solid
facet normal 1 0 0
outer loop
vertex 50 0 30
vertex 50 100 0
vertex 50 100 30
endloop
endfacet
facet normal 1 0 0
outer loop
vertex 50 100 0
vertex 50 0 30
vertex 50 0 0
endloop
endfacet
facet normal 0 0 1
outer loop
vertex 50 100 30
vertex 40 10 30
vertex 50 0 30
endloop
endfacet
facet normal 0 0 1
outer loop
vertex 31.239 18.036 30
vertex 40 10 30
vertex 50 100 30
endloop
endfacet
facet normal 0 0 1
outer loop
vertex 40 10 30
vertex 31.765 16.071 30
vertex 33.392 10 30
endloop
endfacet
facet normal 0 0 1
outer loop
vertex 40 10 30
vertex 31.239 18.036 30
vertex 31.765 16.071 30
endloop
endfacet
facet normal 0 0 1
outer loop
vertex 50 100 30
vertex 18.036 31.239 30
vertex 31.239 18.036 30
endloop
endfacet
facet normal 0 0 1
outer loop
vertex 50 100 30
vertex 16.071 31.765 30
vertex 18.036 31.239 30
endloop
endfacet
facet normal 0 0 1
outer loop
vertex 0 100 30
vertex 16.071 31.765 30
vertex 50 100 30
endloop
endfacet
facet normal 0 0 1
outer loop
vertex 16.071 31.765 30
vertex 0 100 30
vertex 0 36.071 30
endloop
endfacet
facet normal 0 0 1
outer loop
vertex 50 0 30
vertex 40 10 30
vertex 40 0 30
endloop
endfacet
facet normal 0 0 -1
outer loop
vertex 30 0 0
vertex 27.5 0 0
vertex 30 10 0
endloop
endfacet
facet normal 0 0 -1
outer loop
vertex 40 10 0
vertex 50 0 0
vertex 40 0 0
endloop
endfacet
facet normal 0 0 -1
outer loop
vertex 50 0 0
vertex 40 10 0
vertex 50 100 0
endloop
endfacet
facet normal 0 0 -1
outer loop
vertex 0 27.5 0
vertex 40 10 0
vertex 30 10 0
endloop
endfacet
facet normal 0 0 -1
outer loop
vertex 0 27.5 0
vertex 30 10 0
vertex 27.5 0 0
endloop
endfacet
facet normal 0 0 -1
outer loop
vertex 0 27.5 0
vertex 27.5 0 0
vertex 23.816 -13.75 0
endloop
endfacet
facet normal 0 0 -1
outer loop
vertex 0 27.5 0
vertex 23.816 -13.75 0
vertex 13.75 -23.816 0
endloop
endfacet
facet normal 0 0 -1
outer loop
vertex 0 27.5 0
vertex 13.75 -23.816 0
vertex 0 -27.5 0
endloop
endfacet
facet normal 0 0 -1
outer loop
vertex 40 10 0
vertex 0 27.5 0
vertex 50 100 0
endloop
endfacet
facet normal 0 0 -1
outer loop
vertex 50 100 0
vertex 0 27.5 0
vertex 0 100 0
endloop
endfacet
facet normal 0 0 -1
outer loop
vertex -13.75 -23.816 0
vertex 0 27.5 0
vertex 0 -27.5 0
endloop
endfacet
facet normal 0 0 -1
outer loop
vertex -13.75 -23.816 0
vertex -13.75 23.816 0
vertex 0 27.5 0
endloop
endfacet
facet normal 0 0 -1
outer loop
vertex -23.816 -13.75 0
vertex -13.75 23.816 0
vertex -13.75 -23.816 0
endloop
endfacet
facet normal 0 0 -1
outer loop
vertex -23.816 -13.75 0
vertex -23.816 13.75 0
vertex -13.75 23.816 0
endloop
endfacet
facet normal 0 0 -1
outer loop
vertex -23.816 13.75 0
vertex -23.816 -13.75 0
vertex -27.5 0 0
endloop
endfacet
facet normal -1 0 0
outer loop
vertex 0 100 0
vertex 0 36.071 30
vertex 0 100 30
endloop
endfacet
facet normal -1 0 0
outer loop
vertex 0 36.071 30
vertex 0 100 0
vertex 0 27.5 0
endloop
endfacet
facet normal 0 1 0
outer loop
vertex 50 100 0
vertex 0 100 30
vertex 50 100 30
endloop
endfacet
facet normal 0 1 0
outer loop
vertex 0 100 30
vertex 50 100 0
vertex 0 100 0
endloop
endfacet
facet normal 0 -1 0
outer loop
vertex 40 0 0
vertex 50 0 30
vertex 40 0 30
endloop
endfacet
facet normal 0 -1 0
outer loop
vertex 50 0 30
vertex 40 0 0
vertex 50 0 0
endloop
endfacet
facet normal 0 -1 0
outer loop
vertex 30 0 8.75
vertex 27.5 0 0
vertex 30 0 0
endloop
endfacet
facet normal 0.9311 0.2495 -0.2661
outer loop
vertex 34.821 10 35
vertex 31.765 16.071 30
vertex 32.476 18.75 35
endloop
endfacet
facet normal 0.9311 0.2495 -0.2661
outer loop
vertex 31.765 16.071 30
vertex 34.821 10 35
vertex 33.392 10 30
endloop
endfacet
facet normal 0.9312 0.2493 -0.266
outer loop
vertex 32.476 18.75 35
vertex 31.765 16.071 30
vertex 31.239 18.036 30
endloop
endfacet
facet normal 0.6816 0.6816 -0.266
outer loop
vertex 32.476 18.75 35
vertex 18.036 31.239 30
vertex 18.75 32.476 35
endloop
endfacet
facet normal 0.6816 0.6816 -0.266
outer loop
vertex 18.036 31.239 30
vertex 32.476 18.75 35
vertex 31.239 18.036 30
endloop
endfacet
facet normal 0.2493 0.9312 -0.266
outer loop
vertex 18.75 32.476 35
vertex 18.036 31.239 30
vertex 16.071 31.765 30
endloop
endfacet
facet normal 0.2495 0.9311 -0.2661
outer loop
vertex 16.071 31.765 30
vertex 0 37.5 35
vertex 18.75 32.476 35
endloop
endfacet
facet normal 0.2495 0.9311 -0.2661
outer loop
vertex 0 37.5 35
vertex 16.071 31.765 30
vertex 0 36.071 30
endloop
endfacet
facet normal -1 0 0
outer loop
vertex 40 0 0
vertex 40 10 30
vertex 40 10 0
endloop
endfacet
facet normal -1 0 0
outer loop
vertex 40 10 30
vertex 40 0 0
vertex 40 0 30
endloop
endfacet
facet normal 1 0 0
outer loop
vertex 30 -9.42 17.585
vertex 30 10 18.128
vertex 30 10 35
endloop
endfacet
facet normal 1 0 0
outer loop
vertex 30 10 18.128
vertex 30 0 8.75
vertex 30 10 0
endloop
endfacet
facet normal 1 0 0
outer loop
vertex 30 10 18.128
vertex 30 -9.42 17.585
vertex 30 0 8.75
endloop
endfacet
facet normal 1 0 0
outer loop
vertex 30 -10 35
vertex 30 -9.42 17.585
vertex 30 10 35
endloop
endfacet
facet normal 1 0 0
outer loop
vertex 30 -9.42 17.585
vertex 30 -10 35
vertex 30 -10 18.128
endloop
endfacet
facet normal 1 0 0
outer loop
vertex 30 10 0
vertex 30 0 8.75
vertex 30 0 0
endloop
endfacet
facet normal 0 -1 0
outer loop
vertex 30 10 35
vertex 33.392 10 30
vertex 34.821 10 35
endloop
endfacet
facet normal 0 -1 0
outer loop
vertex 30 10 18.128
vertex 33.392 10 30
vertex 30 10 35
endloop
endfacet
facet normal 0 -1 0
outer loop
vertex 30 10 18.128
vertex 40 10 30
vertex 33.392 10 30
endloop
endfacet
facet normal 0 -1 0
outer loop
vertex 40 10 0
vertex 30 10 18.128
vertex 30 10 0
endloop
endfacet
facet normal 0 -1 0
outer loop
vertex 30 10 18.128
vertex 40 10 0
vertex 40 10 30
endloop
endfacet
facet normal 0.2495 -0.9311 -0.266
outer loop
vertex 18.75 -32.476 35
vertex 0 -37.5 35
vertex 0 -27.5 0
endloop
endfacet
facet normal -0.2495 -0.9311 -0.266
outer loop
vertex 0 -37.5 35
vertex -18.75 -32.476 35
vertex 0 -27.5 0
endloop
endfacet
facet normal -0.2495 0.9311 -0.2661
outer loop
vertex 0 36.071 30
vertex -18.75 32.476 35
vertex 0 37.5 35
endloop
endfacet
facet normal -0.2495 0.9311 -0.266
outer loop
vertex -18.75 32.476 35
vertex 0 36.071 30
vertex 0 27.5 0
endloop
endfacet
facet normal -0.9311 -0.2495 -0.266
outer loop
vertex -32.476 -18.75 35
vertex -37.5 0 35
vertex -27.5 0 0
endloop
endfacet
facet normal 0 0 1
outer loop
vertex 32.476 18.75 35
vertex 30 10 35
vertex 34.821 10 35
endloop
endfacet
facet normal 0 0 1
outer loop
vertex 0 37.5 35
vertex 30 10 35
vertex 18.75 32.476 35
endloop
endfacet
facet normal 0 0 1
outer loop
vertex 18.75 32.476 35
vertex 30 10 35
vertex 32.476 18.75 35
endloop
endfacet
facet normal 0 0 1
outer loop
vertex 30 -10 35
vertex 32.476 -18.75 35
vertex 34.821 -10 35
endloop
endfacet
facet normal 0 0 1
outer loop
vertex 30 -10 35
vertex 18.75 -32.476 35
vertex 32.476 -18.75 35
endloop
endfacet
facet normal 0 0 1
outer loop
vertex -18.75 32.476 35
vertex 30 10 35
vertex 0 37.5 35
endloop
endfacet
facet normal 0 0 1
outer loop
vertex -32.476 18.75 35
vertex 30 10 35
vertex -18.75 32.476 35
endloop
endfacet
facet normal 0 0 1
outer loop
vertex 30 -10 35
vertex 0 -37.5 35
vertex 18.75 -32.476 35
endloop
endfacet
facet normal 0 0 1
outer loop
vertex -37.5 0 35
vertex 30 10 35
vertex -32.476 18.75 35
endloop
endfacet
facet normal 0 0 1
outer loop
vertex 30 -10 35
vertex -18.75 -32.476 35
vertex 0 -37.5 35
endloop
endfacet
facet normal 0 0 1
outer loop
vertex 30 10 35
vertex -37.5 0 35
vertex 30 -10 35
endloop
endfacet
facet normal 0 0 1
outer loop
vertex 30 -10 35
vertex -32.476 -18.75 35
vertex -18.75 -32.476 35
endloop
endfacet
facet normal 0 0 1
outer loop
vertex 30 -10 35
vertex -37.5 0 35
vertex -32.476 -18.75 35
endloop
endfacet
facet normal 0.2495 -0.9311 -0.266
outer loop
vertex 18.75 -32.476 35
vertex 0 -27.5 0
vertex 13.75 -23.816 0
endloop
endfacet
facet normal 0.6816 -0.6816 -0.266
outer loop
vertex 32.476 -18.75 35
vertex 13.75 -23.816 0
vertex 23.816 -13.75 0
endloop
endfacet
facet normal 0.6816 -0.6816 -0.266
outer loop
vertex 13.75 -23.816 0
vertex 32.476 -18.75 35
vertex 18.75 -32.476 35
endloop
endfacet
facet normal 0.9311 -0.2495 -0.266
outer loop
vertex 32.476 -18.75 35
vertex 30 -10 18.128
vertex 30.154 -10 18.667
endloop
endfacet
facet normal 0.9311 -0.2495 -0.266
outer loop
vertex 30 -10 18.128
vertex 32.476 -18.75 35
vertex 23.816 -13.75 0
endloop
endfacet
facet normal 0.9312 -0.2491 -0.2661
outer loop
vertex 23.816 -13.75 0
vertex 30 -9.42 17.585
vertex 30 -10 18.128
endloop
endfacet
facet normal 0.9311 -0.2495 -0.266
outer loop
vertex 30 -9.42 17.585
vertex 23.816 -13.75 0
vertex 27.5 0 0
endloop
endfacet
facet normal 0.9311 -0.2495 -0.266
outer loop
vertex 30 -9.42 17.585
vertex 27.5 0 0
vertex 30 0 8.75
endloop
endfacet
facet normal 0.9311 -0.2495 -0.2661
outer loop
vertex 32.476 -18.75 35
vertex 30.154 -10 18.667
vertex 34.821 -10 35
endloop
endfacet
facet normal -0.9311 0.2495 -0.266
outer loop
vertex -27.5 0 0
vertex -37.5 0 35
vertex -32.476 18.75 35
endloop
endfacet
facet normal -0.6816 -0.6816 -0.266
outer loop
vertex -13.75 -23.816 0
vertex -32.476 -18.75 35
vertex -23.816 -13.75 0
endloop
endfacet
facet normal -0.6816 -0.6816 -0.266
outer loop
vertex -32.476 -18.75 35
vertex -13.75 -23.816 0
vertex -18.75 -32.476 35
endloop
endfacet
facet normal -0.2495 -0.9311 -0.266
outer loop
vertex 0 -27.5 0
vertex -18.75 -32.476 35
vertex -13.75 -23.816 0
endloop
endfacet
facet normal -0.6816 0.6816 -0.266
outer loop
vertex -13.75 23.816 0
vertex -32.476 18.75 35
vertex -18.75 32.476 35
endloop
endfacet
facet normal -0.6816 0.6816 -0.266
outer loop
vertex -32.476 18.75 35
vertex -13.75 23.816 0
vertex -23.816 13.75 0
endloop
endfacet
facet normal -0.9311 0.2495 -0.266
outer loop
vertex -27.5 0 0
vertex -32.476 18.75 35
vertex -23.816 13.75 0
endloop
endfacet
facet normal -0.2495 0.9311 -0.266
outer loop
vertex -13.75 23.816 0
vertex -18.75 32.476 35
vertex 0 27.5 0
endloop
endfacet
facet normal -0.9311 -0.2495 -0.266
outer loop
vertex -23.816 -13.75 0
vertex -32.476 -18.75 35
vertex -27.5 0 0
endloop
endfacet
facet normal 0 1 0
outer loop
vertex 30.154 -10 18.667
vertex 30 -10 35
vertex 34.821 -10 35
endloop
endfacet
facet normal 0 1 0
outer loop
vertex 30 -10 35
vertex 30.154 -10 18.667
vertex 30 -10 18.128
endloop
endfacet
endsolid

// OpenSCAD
// * Discription what the *.scad is about ect.

// ==================================
// = Used Libraries =
// ==================================


// ==================================
// = Variables =
// ==================================

// sizing printing or print a small part to test the object.
DesignStatus="sizing"; // ["sizing","fitting","printing"]

GrindingPlate_X=63.5;
GrindingPlate_Y=152.0;
GrindingPlateSteel_h=1.0;
GrindingPlateFoam_h=1.3;

Hole_Count_X=5;
Hole_Count_Y=5;
Width_between_Holes=7;
FrameBezel=0.5;

FrameFoot_X=15.0;
FrameFoot_Y=47.0;

Frame_H=30;
Frame_Top_R=1;
Frame_Base_R=4;


module __Customizer_Limit__ () {}  // bevfore these the variables are usable in the cutomizer
shown_by_customizer = false;
// === Facettes Numbers ===

FrameBase_X=GrindingPlate_X+FrameFoot_X;
FrameBase_Y=GrindingPlate_Y+FrameFoot_Y;



FN_HexNut=6;
FN_Performance=36;
FN_FooBaa=12;
// Divisebile by 4 to align Cylinders whithout small intersections
FN_Rough=12;
FN_MediumRough=16;
FN_Medium=36;
FN_Fine=72;
FN_ExtraFine=144;


// ==================================
// = Tuning Variables =
// ==================================
// Variables for finetuning (The Slegehammer if something has to be made fit)

// ==================================
// = Test Stage =
// ==================================
// BLUEPRINT_Enviroment
module MirrorMirrorOnTheWall(Offset_X,Offset_Y){
    translate([-Offset_X,Offset_Y,0]){
        children();
        mirror([0,1,0]){
            children();
        }
    }
    translate([Offset_X,-Offset_Y,0]){
        mirror([1,0,0]){
            children();
            mirror([1,0,0]){
                children();
            }
        }
    }
}
// BLUEPRINT_Enviroment
if (DesignStatus=="printing"){
    intersection(){
        //TEST_OBJECT(FN_ExtraFine);

        cube([1000,1000,1000],center=true);
    }
}
// BLUEPRINT_Enviroment
if(DesignStatus=="fitting"){
    //TEST_OBJECT(FN_FACETTES=FN_MediumRough);
}
// BLUEPRINT_Enviroment
if (DesignStatus=="sizing"){
    see_me_half(){
        translate([0,0,0]){
            TEST_OBJECT(FN_Rough);
        }
        translate([0,0,0]){
        
        }        
        translate([0,0,0]){
            
        }
        translate([0,0,0]){
        }
        translate([0,0,0]){
        }
        union(){
            TEST_CUTCYLINDER(FN_Rough);
        }
        translate([ 0,0,0]){
        }
    }
}
// BLUEPRINT_Enviroment
module see_me_half(){
    //difference(){
        //union(){
          translate([0,0,0]){
            for(i=[0:1:$children-1]){
                a=255;
                b=50;
                k_farbabstand=((a-b)/$children);
                Farbe=((k_farbabstand*i)/255);
                SINUS_Foo=0.5+(sin(((360/(a-b))*k_farbabstand)*(i+1)))/2;
                COSIN_Foo=0.5+(cos(((360/(a-b))*k_farbabstand)*(i+1)))/2;
                color(c = [ SINUS_Foo,
                            1-(SINUS_Foo/2+COSIN_Foo/2),
                            COSIN_Foo],
                            alpha = 0.5){  
                    //MirrorMirrorOnTheWall(0){
                    difference(){
                        //MirrorMirrorOnTheWall(0){
                            render(convexity=20){children(i);}
                            //children(i);
                            translate([70/2,0,0]){
                                    //cube([80,70,150],center=true);
                                }
                        //}
// Creates a Cutting to see a Sidesection cut of the objects
                            color(c = [ SINUS_Foo,
                                1-(SINUS_Foo/2+COSIN_Foo/2),
                                COSIN_Foo],
                                alpha = 0.0){
                                translate([70/2,0,0]){
                                    #cube([10,20,150],center=true);
                                }
                                translate([0,0,0]){
                                    //cube([30,30,200],center=true);
                                    }
                                }
                            }
                        }
                    }
                }
            }
// == Testprints ==

Projection_Cutter(5){
//see_me_half();
}

//// == Cutes a slice of the Objekts
Intersection_Test_Cut("xy",1.5,16){
 //Intersection_Test_Cut( "xy",           // "Plaine xy yz xz", 
                       // 1,              // Slicethickness , 
                        //5,              // Distance from coordinate origin in plaine )
   // OBJECTMODULESHERE 
   //Frame_Base();
}

// ==================================
// = Modus =
// ==================================

 
// ==================================
// = Stage =
// ==================================
// Final module for Produktion

module Assembly(){

}
module TEST_OBJECT(FN_FACETTES){
    difference(){
        TEST_CUTCUBE();
        TEST_CUTCYLINDER(FN_FACETTES);
    }
}

// ===============================================================================
// =--------------------------------- Enviroment Modules ------------------------=
// ===============================================================================
// Modules that resembles the Enviroment aka the helmet where to atach a camera mount


// ===============================================================================
// =--------------------------------- Modules -----------------------------------=
// ===============================================================================
//TEST_OBJECT();

module TEST_CUTCUBE(){
    cube([50,100,30]);
}
// ===============================================================================
// ---------------------------------- Cutting Modules ----------------------------
// ===============================================================================
// === Half Cutter

//HEX_Mesh_Pattern(){ Mesh(2.5,2.5);}
module HEX_Mesh_Pattern(X=10,Y=30,DELTA=5,GRPL_X=45,GRPL_Y=115){
Count_X=X;
Count_Y=Y;

//DELTA=1;

X_STEPP=5.5+DELTA;
Y_STEPP=7.5+DELTA;

k=DELTA; //Distance between Hexshapes may be HEX_D/4 is good
HEX_D=(GrindingPlate_X-((Count_X-1)*k/2))/(Count_X-1);

SCALE_Y=GrindingPlate_Y/((HEX_D/2+k/4)*sqrt(3)*(Count_Y-1));
echo("HEX_D*Count_Y",HEX_D*(Count_Y));
echo("GrindingPlate_Y",GrindingPlate_Y);
echo("SCALE_Y",SCALE_Y);

//square([15,(HEX_D/2+k/4)*sqrt(3)*(Count_Y-1)]); // Helper Foo
    
// +++++++++++++++++++++++++++++++++++++++++
    scale([1,SCALE_Y,1]){
        union(){
            for(j=[0:1:Count_Y-1]){
                for(i=[0:1:Count_X-1-j%2]){
                    translate([i*(HEX_D+k/2),0,0]){
                        translate([(HEX_D/2+k/4)*(j%2),
                                    j*((HEX_D/2+k/4)*sqrt(3)),
                                    0]                          ){
                        //translate([0,j*Y_STEPP,0]){
                        rotate([0,0,60]){
                            circle(d=HEX_D,$fn=6);
                        }
                            //children();
                        }
                    }
                }
            }
        }
    }
}
//Mesh(5,2);
module Mesh(SHAPEDIMENSION_X=2.5,RADIUS=0.0){
minkowski(){
    circle(SHAPEDIMENSION_X-RADIUS,$fn=6);
    //circle(r=RADIUS,$fn=64);
    }
    //circle(SHAPEDIMENSION_X,$fn=6); // Size Testing
}

module TEST_CUTCYLINDER(FN_FACETTES){
    cylinder(h=35,d1=55,d2=75,$fn=FN_FACETTES);
}

//Screwcutter(100,10,100,4,1,5);
module Screwcutter( SCREW_HEAD_h=200,
                    SCREW_HEAD_d=40,
                    SCREW_BOLT_h=200,
                    SCREW_BOLT_d=3,
                    SCREW_CAMPFER_h,
                    SCREW_CAMPFER_d=SCREW_BOLT_d    ){
    translate([0,0,-SCREW_HEAD_h]){
        cylinder(h=SCREW_HEAD_h,d=SCREW_HEAD_d,$fn=32);
    }
    translate([0,0,0]){
        cylinder(h=SCREW_CAMPFER_h,d2=SCREW_BOLT_d,d1=SCREW_CAMPFER_d,$fn=32);    
    }
    translate([0,0,0]){
        cylinder(h=SCREW_BOLT_h,d=SCREW_BOLT_d,$fn=32);
    }
}
//Bolt(25,3,8,3);
module Bolt(BOLTLENGTH,BOLTDIAMETER,HEADDIAMETER,HEADHEIGHT){
    cylinder(h=BOLTLENGTH,d=BOLTDIAMETER,center=false,$fn=FN_Performance);
    translate([0,0,-HEADHEIGHT/2]){
        cylinder(h=HEADHEIGHT,d=HEADDIAMETER,center=true,$fn=6);
        cylinder(h=HEADHEIGHT,d=HEADDIAMETER,center=true,$fn=6);
    }
}
//Projection_Cutter(3){sphere(10);};
module Projection_Cutter(Offset_z){    
    projection(cut = true){
        translate([0,0,Offset_z]){
            children();
        }
    }
}
// ===============================================================================
// ---------------------------------- Intersection Modules -----------------------
// ===============================================================================

module Intersection_Test_Cut(PLAIN,THICKNESS,OFFSET){
// ==== EXAMPLE ====
//    !Intersection_Test_Cut("xy",1,7/2){sphere(7);};
// ==== EXAMPLE ====
    if (PLAIN=="xz"){
        intersection(){
            children();
            translate([0,OFFSET,0]){
                cube([100,THICKNESS,100],center=true);
            }
        }
    }
    else if (PLAIN=="xy") {
        intersection(){
            children();
            translate([0,0,OFFSET]){
                cube([500,500,THICKNESS],center=true);
            }
        }
    }
    else if (PLAIN=="yz") {
        intersection(){
            children();
            translate([OFFSET,0,0]){
                cube([THICKNESS,100,100],center=true);
            }
        }   
    }
}
// ===============================================================================
// ---------------------------------- Linear Extrude Modules ---------------------
// ===============================================================================

//Ring_Shaper(3,15,1.5);
module Ring_Shaper(HEIGHT,OUTER,WALLTHICKNESS){
    linear_extrude(HEIGHT){
        2D_Ring_Shape(OUTER,WALLTHICKNESS);
    }
}

module Linear_Extruding(ExtrudeLength,ExrtudingDirektionInverter){
    Length=ExtrudeLength;
    translate([0,0,Length*ExrtudingDirektionInverter]){
        linear_extrude(height=ExtrudeLength){
            children();
        }
    }
}

// ===============================================================================
// ---------------------------------- Rotate Extrude Modules ---------------------
// ===============================================================================

//DONUT(1,20,1,7);
module DONUT(DIAMETER,DIAMETER_RING,SCAL_X,SCAL_Y){
//DIAMETER The dough part
//DIAMETER_RING The hole part
//SCAL_X, skales the x dimension
//SCAL_Y, skales the y dimension
    rotate_extrude(angle=360,convexity=3,$fn=FN_Fine){
        translate([DIAMETER_RING,0,0]){
            scale([SCAL_X,SCAL_Y,1]){
                circle(d=DIAMETER,$fn=FN_Fine);
            }
        }
    }
}
// ===============================================================================
// =--------------------------------- 2D-Shapes ---------------------------------=
// ===============================================================================

//2D_Ring_Shape(20,1);
module 2D_Ring_Shape(OUTER_D,WALLTHICKNESS){
    difference(){
        circle(d=OUTER_D,$fn=FN_Fine);
        circle(d=OUTER_D-2*WALLTHICKNESS,$fn=FN_Fine);
    }
}
//2D_Rounded_Square_Base_Shape(10,20,3);
module 2D_Rounded_Square_Base_Shape(DIMENSION_X=10,DIMENSION_Y=20,RADIUS=2,CENTER=true){
    if(CENTER){
        translate([0,0,0]){
            minkowski(){
                square([DIMENSION_X-RADIUS*2,DIMENSION_Y-RADIUS*2],center=CENTER);
                circle(r=RADIUS,$fn=FN_Fine);
            }
        }
    }
    else{
        translate([RADIUS,RADIUS,0]){
            minkowski(){
                square([DIMENSION_X-RADIUS*2,DIMENSION_Y-RADIUS*2],center=CENTER);
                circle(r=RADIUS,$fn=FN_Fine);
            }
        }
    }
}
// ===============================================================================
// =--------------------------------- Symetrie Helper ---------------------------=
// ===============================================================================
//XY_Symetrie(10,25){cube(10);}
module XY_Symetrie(X=10,Y=25){
   translate([X,Y,0]){
       children();
       }
    mirror([1,0,0]){
        translate([X,Y,0]){
            children();
       }
    }
    mirror([0,1,0]){
        translate([X,Y,0]){
            children();
        }
        mirror([1,0,0]){
            translate([X,Y,0]){
                children();
            }
        }
    }
}
// ===============================================================================
// =--------------------------------- Textembossing -----------------------------=
// ===============================================================================


// ===============================================================================
// =--------------------------------- Smoothing ---------------------------------=
// ===============================================================================

2D_Smooth_r=1;
// Radius of a outer Tip Rounding 
2D_Fillet_r=1;
// Radius of a inner corner Ronding
2D_Chamfer_DELTA_INN=1;
2D_Chamfer_DELTA_OUT=2;

// a straigt line on edges and corners
2D_Chamfer_BOOLEAN=false;

    
module Smooth(r=3){
    //$fn=30;
    offset(r=r,$fn=30){
        offset(r=-r,$fn=30){
        children();
        }
    }
}
module Fillet(r=3){
    //$fn=30;
    offset(r=-r,$fn=30){
        offset(r=r,$fn=30){
            children();
        }
    }
}
module Chamfer_OUTWARD(DELTA_OUT=3){
    //$fn=30;
    offset(delta=DELTA_OUT,chamfer=true,$fn=30){
        offset(delta=-DELTA_OUT,chamfer=true, $fn=30){
            children();
        }
    }
}
module Chamfer_INWARD(DELTA_INN=3){
    //$fn=30;
    offset(delta=-DELTA_INN,chamfer=true,$fn=30){
        offset(delta=DELTA_INN,chamfer=true, $fn=30){
            children();
        }
    }
}

// ===============================================================================
// =--------------------------------- Ruthex --------------------------------=
// ===============================================================================
// Dimensions for Ruthex Tread inseerts

//RUTHEX_M3();
module RUTHEX_M3(){    
L=5.7+5.7*0.25; // Length + Margin
echo("RUTHEX",L);
D1=4.0;    
    translate([0,0,0]){
        rotate([0,0,0]){
            translate([0,0,0]){
                cylinder(h=L,d1=D1,d2=D1,$fn=FN_Performance);
            }
        }
    }
}

// ===============================================================================
// =--------------------------------- Import STL --------------------------------=
// ===============================================================================

module NAME_OF_IMPORT(){
    rotate([0,0,-90]){
        translate([-515,-100,-45]){
            import("PATH/TO/FILE.stl",convexity=3);
        }
    }
}

// ===============================================================================
// =--------------------------------- Import PNG --------------------------------=
// ===============================================================================

module NAME_OF_IMPORT(){
    rotate([0,0,-90]){
        translate([-515,-100,-45]){
            import("PATH/TO/FILE.PNG",convexity=3);
        }
    }
}
